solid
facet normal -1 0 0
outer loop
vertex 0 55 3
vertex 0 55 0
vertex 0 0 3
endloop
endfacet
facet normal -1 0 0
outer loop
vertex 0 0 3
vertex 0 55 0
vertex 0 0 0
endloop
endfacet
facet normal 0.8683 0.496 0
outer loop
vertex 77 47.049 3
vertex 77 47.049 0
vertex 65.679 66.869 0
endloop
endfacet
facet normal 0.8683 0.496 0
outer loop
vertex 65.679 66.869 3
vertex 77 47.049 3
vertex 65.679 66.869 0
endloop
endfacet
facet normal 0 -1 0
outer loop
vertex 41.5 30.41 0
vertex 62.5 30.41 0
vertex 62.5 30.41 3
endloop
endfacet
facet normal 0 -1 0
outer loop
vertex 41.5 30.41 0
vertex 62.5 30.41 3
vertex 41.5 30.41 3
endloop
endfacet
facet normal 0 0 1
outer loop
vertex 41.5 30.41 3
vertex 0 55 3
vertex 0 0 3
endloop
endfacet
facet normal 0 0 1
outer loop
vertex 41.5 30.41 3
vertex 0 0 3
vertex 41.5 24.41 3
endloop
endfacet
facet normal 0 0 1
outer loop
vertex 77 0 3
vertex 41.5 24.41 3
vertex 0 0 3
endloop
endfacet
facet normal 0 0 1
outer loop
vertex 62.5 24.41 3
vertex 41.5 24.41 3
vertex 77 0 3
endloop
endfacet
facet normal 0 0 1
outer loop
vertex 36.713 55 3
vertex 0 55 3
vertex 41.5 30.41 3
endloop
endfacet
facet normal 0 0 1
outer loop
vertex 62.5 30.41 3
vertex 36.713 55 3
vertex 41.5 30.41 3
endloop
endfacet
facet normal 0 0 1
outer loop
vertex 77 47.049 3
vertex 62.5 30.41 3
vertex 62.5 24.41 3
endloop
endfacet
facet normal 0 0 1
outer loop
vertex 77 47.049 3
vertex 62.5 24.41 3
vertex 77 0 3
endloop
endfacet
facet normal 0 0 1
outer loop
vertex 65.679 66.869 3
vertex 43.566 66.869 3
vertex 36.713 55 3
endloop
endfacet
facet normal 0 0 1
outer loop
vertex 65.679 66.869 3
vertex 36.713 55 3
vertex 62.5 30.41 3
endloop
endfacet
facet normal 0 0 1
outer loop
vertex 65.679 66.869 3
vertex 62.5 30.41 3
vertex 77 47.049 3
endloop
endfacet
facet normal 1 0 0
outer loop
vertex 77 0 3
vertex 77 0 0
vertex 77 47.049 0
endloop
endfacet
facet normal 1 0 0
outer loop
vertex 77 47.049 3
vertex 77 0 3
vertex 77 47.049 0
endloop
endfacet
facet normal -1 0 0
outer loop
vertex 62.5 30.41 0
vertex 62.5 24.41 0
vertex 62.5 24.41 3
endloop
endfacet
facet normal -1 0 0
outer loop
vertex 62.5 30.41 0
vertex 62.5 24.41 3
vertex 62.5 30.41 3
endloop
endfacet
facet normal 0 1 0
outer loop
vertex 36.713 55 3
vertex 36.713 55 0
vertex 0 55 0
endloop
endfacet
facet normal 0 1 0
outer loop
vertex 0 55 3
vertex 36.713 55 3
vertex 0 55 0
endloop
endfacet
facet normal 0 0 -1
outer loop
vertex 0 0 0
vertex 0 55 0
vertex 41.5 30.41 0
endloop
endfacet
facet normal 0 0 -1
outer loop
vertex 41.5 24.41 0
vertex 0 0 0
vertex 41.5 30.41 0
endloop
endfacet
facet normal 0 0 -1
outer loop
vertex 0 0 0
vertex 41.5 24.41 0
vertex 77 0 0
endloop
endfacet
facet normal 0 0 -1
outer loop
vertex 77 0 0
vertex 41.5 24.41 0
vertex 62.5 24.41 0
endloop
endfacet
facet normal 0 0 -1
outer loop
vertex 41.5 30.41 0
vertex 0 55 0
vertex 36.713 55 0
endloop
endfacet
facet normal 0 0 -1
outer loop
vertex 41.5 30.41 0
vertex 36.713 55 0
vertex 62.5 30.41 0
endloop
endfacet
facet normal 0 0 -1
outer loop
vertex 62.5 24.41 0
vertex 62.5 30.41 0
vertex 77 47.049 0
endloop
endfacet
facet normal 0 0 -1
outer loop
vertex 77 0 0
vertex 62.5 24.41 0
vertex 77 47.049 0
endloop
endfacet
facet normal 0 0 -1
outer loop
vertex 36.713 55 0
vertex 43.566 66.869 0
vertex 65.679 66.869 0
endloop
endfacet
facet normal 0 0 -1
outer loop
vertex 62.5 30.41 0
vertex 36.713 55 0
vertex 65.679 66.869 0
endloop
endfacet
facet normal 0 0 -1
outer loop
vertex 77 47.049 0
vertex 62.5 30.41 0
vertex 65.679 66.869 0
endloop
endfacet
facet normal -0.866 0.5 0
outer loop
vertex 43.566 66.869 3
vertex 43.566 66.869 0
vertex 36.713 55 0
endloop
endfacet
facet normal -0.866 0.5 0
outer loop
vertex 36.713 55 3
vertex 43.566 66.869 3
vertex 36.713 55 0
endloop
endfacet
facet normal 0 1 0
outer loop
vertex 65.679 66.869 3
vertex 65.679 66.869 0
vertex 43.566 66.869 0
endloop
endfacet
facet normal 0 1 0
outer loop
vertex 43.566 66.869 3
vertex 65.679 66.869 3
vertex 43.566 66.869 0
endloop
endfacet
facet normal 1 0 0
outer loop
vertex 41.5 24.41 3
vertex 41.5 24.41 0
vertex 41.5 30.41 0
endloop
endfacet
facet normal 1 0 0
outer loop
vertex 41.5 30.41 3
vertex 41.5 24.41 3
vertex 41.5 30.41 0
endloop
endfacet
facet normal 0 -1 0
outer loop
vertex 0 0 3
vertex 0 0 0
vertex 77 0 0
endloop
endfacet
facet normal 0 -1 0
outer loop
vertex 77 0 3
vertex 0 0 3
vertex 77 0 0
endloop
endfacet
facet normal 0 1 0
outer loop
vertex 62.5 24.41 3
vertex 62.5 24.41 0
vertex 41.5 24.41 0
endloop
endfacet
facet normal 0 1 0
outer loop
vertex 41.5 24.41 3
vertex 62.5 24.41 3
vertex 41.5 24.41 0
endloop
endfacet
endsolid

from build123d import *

# Parameters (mm, degrees)
BOSS_EXTRUDE1_DEPTH = 3
SKETCH3_W           = 21
SKETCH3_H           = 6
CUT_EXTRUDE1_DEPTH  = 10


with BuildPart() as part:
    # Sketch2 → Boss-Extrude1 (new body)
    with BuildSketch(Plane.XY):
        Polygon((0, 0), (77, 0), (77, 47.04888), (65.6794, 66.86939), (43.56615, 66.86939), (36.71335, 55), (0, 55), align=None)
    extrude(amount=BOSS_EXTRUDE1_DEPTH)

    # Sketch3 → Cut-Extrude1 (cut)
    with BuildSketch(Plane(origin=(0, 0, 0), x_dir=(-1, 0, 0), z_dir=(0, 0, -1))):
        with Locations((-52, 27.41)):
            Rectangle(SKETCH3_W, SKETCH3_H)
    extrude(amount=-CUT_EXTRUDE1_DEPTH, mode=Mode.SUBTRACT)


solid = part.part
